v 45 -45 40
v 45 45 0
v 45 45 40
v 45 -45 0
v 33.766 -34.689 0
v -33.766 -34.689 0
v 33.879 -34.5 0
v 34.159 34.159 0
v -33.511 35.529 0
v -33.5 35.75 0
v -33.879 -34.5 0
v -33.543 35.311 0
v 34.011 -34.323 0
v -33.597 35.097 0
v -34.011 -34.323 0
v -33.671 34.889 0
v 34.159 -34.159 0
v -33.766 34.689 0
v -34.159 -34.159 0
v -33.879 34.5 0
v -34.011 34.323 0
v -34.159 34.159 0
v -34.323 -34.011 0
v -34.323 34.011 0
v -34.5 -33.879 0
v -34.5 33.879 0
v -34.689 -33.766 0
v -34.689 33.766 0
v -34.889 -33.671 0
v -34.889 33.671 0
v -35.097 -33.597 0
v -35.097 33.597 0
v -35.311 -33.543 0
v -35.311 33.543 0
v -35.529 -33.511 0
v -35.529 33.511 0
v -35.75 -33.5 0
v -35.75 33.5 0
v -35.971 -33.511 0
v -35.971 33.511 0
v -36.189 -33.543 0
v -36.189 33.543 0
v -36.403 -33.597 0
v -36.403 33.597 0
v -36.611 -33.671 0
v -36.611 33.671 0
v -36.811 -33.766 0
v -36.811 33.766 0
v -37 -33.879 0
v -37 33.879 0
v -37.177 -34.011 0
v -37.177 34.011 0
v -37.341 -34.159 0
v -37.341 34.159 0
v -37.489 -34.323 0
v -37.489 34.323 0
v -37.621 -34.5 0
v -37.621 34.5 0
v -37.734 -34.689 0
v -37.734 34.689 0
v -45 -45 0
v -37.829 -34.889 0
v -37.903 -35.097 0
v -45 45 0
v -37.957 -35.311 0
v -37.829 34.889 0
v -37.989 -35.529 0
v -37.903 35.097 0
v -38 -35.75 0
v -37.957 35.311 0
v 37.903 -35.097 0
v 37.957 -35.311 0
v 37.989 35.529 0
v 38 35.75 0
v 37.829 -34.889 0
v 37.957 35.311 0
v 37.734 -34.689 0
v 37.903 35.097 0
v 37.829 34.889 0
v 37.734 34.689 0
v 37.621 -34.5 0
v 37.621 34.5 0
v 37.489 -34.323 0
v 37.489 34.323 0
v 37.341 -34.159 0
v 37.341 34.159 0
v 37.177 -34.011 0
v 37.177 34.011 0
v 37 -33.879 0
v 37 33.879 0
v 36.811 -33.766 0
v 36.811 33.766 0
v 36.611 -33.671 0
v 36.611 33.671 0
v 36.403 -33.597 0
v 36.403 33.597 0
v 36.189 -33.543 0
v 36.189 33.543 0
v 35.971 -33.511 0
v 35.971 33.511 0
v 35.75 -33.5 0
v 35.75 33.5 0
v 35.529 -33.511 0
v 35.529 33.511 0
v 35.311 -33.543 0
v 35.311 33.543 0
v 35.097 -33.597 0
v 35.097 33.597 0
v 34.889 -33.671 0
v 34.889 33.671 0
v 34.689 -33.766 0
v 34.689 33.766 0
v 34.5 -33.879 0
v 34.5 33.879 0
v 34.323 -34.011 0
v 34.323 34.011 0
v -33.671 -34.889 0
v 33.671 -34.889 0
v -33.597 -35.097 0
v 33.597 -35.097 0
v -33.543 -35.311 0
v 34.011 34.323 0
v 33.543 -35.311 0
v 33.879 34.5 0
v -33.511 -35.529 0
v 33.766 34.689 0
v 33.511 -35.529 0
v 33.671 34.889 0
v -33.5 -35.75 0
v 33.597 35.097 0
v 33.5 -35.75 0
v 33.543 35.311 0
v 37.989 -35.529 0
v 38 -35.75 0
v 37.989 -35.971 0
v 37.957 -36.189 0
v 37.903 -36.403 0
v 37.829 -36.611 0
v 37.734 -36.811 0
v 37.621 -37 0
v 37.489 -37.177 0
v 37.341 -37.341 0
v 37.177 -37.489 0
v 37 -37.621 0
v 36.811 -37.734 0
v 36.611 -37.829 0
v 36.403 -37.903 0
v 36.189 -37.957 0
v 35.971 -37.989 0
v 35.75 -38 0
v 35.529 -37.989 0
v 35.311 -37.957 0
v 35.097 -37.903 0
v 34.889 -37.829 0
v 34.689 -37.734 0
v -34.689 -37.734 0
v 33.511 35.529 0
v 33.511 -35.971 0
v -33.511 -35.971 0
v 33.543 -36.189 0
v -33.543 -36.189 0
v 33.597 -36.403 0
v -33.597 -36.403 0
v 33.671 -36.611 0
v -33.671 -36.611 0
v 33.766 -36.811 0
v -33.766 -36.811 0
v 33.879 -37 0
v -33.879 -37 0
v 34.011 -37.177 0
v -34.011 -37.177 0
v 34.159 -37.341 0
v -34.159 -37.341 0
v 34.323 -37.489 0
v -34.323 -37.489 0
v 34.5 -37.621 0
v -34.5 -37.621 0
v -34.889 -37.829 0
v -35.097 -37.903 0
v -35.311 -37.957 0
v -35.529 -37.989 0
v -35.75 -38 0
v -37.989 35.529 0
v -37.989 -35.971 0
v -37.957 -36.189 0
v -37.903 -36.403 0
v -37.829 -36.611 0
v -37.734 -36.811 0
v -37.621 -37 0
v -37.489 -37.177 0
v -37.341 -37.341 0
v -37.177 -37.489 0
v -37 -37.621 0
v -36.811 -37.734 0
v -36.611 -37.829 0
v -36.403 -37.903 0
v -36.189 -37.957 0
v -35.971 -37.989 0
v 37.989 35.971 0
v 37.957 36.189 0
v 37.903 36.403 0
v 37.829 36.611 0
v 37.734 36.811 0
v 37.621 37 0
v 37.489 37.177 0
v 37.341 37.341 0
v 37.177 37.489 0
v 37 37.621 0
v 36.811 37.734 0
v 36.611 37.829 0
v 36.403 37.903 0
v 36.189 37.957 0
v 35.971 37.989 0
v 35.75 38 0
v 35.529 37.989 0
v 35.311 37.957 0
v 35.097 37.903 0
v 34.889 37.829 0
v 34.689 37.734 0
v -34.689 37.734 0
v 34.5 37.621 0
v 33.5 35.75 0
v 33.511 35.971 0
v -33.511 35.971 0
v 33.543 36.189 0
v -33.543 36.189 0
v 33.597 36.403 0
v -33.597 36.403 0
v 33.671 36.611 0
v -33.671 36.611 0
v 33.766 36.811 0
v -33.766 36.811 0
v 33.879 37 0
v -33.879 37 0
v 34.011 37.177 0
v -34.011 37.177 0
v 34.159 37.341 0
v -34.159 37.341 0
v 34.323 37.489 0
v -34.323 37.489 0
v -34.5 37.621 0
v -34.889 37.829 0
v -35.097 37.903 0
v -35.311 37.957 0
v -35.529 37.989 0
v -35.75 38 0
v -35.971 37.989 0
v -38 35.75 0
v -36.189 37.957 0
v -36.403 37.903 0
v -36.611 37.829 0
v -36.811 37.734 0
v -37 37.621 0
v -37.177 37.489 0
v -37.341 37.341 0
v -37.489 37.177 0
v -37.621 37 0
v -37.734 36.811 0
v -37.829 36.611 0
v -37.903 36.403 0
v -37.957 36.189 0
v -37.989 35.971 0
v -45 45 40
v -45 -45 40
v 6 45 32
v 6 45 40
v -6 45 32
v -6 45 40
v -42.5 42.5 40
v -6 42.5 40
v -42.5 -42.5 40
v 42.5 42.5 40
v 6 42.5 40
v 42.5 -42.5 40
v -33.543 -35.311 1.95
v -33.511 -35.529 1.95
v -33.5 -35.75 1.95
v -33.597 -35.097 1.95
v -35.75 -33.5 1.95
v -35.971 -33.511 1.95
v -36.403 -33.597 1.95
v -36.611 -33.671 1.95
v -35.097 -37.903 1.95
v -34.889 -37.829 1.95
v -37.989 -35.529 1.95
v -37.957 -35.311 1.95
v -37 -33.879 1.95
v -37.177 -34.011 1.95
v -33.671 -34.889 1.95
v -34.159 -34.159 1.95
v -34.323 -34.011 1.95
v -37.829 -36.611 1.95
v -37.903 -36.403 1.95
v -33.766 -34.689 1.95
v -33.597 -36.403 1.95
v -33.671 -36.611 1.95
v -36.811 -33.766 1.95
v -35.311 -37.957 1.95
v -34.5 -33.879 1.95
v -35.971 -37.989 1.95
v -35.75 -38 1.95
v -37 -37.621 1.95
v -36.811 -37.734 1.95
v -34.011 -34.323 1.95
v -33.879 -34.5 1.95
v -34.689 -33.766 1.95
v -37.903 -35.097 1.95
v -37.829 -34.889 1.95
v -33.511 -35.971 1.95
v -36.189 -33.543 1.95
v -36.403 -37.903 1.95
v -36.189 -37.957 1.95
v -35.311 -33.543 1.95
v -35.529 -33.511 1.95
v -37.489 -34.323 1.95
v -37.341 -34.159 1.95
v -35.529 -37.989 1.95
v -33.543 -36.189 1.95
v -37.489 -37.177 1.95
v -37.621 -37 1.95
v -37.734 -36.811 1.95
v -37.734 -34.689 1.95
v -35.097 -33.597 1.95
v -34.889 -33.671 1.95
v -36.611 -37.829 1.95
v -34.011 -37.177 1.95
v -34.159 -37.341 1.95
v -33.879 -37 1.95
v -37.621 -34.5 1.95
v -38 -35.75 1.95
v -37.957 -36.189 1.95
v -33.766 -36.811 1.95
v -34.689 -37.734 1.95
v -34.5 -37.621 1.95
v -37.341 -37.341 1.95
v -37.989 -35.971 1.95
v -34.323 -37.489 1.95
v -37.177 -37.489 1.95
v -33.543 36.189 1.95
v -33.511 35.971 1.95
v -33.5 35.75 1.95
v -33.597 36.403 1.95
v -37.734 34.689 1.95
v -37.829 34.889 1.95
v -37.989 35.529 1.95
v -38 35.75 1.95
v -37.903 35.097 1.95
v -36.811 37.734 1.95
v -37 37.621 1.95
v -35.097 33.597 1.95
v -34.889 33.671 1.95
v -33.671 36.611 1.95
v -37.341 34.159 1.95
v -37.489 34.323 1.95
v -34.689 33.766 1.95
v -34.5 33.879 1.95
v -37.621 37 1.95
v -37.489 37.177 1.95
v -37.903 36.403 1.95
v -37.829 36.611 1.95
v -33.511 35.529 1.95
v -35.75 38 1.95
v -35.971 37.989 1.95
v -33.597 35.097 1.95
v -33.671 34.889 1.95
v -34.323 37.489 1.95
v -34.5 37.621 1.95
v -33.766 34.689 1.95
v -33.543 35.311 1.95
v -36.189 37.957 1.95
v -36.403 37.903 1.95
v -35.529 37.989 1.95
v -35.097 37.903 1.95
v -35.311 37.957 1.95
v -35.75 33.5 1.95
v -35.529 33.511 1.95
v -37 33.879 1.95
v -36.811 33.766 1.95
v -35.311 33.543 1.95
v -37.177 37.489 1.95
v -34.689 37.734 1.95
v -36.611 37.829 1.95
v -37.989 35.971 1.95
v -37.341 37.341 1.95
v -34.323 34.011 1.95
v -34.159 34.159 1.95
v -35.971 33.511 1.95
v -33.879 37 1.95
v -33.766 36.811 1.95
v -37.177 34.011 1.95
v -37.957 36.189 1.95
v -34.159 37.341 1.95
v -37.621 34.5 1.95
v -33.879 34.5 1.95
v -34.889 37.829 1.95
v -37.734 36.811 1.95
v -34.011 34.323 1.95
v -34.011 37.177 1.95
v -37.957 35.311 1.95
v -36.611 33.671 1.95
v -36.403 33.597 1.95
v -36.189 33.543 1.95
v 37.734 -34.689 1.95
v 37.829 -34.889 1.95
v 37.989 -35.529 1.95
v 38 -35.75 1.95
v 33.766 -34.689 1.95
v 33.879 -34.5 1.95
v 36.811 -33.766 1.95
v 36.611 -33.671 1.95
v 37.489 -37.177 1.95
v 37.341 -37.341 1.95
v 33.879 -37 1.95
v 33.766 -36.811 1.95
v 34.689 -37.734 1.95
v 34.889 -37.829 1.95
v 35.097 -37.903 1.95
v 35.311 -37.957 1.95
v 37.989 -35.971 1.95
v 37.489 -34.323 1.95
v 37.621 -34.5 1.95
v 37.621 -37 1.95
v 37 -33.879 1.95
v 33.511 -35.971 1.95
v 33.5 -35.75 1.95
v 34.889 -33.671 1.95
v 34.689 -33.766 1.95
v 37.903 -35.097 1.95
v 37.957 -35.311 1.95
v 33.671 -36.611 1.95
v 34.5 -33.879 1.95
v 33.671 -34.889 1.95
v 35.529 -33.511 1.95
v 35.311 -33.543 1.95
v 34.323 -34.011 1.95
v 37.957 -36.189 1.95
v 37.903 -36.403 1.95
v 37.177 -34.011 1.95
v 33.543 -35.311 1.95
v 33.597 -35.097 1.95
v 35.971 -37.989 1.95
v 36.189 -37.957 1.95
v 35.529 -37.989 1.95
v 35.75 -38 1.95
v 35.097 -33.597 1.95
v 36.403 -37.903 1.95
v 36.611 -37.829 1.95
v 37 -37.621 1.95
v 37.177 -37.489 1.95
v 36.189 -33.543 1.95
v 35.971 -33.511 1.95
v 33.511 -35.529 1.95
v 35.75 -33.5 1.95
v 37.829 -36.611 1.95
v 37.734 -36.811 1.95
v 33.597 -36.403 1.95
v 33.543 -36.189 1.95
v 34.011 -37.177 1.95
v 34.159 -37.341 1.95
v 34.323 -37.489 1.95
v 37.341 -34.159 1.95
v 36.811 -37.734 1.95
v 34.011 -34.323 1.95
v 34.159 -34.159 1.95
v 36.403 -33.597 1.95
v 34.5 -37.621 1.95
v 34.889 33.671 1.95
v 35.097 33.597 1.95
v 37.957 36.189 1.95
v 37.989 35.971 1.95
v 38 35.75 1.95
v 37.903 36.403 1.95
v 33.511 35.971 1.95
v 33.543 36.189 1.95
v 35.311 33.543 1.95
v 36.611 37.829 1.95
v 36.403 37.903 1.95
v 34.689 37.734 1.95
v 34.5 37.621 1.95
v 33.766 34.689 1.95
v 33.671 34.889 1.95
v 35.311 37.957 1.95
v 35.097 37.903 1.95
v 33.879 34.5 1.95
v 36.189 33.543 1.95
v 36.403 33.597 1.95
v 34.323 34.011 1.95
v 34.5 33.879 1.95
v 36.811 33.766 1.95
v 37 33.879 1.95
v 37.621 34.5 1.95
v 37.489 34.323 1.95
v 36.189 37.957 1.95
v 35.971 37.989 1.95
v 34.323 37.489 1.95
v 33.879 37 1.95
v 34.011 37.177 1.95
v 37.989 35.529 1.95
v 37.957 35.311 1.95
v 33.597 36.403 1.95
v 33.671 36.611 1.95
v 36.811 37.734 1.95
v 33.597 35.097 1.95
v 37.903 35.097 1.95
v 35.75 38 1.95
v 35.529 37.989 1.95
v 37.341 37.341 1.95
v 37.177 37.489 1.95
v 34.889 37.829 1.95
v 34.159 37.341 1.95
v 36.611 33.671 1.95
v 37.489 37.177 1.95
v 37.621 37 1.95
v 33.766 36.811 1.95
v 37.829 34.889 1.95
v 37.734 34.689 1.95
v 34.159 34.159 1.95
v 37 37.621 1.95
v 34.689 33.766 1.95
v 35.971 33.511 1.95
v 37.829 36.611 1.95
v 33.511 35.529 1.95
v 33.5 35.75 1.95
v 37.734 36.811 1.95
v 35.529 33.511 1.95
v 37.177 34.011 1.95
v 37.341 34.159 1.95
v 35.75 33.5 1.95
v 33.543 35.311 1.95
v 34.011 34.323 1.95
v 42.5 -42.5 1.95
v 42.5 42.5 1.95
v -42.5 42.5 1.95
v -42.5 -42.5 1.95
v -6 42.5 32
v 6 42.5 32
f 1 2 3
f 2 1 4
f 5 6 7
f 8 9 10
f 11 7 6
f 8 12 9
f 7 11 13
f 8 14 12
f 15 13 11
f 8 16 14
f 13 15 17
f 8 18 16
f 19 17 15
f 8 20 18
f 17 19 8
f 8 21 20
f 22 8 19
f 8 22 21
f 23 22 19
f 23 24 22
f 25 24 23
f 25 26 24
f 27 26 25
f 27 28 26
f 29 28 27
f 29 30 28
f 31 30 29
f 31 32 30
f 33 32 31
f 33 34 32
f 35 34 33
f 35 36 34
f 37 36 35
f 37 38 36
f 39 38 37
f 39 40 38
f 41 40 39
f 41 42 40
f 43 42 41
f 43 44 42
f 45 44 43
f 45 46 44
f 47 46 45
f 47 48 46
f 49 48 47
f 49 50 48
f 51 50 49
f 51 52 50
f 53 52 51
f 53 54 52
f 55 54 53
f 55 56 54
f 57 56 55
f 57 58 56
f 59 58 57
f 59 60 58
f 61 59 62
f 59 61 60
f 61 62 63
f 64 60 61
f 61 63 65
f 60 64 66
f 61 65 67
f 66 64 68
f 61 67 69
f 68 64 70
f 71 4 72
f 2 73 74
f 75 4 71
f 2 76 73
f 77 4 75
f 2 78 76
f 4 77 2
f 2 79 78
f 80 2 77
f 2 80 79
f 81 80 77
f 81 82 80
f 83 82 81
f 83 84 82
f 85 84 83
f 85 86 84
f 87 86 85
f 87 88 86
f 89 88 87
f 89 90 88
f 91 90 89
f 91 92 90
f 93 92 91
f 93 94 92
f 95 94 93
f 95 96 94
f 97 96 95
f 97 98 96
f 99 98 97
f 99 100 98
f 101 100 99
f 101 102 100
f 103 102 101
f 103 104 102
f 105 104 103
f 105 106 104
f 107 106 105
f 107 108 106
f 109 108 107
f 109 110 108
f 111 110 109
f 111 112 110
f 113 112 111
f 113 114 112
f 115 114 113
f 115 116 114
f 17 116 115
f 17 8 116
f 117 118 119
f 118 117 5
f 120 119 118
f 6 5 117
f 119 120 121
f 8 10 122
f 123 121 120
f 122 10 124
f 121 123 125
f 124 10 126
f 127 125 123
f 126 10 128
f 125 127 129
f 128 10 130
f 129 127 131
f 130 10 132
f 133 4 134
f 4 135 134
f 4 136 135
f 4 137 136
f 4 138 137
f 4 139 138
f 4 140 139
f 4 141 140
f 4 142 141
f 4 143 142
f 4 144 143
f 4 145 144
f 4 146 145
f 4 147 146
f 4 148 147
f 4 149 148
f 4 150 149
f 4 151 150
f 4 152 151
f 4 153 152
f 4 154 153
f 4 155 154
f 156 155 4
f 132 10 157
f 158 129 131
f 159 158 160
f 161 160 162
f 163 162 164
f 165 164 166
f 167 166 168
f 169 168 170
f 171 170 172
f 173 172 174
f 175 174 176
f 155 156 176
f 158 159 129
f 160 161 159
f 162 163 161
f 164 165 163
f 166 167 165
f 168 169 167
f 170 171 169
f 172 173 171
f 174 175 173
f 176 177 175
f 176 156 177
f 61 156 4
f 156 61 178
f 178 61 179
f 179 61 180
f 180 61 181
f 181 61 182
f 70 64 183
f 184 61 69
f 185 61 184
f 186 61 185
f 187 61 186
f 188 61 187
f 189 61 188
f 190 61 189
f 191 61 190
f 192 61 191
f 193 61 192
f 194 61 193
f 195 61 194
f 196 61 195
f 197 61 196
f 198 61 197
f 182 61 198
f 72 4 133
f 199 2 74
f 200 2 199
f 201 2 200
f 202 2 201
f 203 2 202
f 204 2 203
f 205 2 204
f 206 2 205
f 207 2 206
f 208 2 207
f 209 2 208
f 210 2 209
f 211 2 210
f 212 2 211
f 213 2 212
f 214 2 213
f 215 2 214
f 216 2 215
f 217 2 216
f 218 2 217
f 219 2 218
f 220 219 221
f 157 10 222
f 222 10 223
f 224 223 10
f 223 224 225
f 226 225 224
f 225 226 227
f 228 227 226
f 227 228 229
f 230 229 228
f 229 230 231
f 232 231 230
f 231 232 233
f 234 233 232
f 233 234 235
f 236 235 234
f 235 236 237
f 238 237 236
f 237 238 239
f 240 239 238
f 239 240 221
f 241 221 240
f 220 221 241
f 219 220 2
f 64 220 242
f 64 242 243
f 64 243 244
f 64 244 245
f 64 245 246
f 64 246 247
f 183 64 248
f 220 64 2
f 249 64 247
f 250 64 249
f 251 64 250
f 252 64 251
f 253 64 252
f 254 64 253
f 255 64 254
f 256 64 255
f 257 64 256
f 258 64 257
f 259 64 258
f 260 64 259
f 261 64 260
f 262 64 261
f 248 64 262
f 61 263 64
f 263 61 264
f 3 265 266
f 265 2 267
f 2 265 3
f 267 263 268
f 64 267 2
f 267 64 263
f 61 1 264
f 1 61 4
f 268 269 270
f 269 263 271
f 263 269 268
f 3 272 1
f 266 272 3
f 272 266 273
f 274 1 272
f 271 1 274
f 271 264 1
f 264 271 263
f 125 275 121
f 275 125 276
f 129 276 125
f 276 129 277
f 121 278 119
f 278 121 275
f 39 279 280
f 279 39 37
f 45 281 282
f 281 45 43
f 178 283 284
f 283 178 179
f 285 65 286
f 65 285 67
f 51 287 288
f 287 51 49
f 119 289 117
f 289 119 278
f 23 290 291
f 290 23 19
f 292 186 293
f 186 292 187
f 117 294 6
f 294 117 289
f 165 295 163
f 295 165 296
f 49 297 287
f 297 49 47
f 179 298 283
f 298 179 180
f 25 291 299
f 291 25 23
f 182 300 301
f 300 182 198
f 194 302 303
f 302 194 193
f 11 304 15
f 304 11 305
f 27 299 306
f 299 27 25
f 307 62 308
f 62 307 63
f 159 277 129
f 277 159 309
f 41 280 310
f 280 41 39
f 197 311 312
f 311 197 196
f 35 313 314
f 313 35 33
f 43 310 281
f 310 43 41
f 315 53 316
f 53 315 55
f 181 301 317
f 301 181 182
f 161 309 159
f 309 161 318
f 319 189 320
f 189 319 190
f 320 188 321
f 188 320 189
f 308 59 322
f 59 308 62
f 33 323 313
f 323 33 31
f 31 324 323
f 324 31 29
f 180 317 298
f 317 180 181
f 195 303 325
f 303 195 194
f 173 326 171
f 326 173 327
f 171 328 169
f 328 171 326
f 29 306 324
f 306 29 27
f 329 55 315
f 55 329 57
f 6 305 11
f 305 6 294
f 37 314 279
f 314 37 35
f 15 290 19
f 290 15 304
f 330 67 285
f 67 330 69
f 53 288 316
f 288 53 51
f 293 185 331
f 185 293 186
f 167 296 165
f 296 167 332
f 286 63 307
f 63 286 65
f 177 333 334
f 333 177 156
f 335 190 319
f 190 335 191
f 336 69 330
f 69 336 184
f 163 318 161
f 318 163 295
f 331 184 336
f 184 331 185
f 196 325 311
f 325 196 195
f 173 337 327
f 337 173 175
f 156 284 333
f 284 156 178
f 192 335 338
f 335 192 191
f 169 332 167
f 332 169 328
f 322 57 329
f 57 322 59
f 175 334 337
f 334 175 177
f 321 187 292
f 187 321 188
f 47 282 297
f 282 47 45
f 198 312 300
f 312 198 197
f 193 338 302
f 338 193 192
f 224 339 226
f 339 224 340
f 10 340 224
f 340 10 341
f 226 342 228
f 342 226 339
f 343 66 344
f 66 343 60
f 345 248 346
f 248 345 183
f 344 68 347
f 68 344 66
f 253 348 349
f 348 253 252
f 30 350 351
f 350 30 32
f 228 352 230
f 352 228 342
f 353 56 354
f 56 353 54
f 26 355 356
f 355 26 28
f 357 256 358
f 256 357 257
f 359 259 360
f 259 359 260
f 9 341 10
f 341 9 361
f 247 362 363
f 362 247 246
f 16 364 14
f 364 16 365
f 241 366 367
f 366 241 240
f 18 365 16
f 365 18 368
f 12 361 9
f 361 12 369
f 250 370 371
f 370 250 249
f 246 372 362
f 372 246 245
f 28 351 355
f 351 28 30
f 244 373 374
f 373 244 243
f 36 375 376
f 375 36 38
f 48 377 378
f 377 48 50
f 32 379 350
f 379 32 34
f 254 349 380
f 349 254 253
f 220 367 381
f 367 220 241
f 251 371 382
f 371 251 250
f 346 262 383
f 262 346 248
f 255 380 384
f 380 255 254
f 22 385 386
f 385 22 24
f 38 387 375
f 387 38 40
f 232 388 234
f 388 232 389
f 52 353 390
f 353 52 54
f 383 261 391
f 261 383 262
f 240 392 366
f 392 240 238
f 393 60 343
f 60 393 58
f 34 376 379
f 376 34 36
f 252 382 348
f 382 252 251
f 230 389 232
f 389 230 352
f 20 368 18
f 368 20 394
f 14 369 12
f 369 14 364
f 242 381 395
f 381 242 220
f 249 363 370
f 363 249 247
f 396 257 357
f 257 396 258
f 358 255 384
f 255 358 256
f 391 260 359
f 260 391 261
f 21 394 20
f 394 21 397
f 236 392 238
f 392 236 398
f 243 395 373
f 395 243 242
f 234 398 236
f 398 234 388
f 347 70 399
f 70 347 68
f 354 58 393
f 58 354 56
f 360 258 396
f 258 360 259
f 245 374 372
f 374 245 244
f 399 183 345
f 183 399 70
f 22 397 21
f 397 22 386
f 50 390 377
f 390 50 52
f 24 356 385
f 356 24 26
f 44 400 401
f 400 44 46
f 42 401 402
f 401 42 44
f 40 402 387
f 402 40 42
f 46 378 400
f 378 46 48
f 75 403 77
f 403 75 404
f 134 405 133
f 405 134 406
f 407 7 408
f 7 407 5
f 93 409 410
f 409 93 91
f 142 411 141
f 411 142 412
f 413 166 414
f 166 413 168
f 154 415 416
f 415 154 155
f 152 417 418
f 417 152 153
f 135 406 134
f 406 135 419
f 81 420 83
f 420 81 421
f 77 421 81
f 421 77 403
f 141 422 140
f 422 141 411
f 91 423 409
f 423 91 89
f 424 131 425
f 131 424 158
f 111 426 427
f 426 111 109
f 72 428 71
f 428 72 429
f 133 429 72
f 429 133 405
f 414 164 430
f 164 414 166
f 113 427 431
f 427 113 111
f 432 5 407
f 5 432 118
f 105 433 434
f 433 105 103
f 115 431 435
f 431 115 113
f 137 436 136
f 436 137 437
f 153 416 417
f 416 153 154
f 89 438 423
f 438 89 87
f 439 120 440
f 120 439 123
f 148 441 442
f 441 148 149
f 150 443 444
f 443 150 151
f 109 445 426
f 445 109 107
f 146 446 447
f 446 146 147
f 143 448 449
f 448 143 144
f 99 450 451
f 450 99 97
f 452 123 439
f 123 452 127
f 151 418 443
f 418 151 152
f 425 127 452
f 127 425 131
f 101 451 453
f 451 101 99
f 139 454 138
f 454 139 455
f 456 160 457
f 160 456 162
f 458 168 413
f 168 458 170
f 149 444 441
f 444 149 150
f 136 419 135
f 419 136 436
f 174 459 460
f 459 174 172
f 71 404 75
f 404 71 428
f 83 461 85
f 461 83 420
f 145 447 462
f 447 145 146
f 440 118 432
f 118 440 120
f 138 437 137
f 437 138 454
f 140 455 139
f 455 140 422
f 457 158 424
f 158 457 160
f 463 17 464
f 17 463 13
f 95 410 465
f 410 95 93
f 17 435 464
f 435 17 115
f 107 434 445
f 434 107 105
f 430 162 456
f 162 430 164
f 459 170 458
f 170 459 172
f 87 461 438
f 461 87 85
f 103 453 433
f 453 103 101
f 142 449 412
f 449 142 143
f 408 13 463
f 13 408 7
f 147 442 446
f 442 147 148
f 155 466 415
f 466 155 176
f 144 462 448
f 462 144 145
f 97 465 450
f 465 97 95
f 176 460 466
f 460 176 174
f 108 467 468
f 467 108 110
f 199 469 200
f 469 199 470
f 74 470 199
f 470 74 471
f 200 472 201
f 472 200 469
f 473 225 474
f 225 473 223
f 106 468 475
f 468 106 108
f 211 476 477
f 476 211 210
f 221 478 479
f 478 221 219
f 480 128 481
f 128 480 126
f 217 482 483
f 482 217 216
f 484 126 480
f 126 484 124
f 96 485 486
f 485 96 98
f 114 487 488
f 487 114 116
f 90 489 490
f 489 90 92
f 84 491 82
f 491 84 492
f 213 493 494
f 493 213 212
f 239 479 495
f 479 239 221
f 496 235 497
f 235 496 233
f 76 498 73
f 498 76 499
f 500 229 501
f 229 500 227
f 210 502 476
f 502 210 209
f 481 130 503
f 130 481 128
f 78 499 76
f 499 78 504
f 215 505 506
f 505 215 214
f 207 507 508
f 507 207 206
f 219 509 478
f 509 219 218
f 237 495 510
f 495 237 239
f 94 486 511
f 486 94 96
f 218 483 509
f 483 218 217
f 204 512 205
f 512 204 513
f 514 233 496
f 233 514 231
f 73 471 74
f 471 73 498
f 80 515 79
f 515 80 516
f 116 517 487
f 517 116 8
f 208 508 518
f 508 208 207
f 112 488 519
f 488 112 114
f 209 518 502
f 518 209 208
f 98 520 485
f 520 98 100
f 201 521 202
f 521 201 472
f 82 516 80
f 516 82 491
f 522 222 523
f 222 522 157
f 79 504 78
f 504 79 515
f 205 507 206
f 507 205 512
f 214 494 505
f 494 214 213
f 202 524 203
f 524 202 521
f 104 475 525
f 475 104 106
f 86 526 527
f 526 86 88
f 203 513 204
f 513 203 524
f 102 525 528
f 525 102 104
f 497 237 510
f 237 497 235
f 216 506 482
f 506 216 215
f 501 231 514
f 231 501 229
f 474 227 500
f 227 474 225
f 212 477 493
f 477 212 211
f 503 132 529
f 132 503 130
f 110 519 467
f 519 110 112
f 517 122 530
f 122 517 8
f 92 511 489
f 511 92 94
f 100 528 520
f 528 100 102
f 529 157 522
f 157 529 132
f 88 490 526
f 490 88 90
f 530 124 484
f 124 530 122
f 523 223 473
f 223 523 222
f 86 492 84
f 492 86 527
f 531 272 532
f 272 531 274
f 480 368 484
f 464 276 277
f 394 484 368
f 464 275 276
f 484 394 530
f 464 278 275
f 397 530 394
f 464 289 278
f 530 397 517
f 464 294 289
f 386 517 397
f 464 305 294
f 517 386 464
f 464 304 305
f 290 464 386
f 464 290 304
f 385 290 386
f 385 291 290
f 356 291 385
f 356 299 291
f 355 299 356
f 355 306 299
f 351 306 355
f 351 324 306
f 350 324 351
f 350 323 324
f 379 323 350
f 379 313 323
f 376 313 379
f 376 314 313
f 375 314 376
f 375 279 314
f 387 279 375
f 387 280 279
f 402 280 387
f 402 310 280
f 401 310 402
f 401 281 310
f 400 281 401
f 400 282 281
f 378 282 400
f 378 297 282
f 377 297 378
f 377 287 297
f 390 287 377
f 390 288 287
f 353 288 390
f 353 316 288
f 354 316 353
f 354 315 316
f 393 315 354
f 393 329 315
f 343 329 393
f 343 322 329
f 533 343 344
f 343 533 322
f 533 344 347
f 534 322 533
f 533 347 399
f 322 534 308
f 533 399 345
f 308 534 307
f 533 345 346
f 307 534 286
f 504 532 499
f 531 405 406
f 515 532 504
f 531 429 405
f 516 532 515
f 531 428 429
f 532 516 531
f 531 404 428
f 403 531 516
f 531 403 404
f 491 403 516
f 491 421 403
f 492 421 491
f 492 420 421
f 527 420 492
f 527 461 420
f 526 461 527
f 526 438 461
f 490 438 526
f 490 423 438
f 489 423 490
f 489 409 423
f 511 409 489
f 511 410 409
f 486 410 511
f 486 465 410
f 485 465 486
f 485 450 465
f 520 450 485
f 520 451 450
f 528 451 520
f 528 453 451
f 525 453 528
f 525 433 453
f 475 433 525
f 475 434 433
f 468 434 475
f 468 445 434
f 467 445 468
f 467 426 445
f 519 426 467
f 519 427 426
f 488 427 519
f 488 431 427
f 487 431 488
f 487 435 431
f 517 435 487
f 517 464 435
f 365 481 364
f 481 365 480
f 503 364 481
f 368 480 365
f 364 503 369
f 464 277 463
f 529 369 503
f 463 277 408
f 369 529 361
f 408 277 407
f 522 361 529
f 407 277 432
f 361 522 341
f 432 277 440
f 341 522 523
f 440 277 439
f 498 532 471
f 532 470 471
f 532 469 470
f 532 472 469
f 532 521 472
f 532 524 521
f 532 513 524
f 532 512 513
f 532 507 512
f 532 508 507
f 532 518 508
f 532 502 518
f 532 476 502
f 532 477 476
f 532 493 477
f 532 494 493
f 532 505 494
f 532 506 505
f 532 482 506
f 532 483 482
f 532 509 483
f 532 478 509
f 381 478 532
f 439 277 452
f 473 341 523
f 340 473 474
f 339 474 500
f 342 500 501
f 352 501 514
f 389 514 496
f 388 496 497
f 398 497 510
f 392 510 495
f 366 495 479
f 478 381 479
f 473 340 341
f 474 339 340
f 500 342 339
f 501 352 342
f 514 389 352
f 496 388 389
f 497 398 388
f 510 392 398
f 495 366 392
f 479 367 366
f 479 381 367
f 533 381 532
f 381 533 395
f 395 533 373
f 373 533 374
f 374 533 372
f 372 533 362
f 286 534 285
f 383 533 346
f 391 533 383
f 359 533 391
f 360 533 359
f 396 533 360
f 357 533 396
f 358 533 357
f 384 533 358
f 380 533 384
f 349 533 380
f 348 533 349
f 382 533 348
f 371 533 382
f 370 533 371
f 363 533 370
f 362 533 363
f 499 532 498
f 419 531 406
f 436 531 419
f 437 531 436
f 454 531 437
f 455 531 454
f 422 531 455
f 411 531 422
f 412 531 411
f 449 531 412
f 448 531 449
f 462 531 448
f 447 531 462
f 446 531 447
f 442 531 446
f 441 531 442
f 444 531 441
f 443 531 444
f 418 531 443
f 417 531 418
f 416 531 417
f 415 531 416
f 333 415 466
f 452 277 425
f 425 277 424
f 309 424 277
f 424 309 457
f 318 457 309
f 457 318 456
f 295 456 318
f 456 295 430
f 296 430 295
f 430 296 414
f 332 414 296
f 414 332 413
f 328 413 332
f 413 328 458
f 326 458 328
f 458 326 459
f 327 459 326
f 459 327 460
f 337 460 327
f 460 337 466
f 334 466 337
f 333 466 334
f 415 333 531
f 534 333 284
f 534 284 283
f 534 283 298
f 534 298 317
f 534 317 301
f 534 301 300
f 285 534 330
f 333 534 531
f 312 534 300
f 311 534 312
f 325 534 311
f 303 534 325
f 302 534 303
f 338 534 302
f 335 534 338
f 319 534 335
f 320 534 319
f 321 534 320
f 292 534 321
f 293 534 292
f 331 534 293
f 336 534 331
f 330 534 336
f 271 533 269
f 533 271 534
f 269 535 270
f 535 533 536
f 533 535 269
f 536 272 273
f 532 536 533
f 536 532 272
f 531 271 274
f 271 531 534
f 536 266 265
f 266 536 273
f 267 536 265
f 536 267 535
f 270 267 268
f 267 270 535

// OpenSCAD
// DIY Magnetic Stirrer Housing
// Upside-down open box for 80mm PC fan
// Print orientation: top plate on bed (z=0-2), walls rising to z=40

// Dimensions (all in mm)
outer_size = 90;              // Outer dimension 90 x 90 mm
top_plate_thickness = 2;      // Top plate thickness
wall_thickness = 2.5;         // Wall thickness on all sides
total_height = 40;            // Total height from bed to open edge
mounting_hole_diameter = 4.5; // M4 screw hole diameter
mounting_hole_pattern = 71.5; // Mounting hole square pattern (center-to-center)
cable_notch_width = 12;       // Power cable notch width
cable_notch_depth = 8;        // Notch depth from open edge

// Resolution for curves
$fn = 64;

// Derived dimensions
inner_size = outer_size - 2 * wall_thickness;  // 85 mm inner cavity
wall_height = total_height - top_plate_thickness;  // 38 mm
hole_offset = mounting_hole_pattern / 2;  // 35.75 mm from center to each hole

difference() {
    // Create outer box shell
    union() {
        // Top plate: 90 x 90 x 2 mm at z = 0 to 2
        translate([0, 0, top_plate_thickness / 2])
            cube([outer_size, outer_size, top_plate_thickness], center = true);
        
        // Walls: 90 x 90 outer, rising from z = 2 to z = 40
        translate([0, 0, top_plate_thickness + wall_height / 2])
            cube([outer_size, outer_size, wall_height], center = true);
    }
    
    // Cut out interior cavity (hollow the walls)
    // Creates 85 x 85 mm cavity from z = 2 to z = 40
    translate([0, 0, top_plate_thickness + wall_height / 2])
        cube([inner_size, inner_size, wall_height + 0.1], center = true);
    
    // Drill four M4 mounting holes through top plate
    // 71.5 mm square pattern, centered on plate
    for (dx = [-1, 1]) {
        for (dy = [-1, 1]) {
            translate([dx * hole_offset, dy * hole_offset, -0.5])
                cylinder(h = top_plate_thickness + 1, r = mounting_hole_diameter / 2, $fn = 64);
        }
    }
    
    // Power cable notch in +Y wall
    // 12 mm wide (X direction), centered, 8 mm deep from open edge (z = 32 to z = 40)
    notch_z_center = total_height - cable_notch_depth / 2;
    notch_y_center = outer_size / 2 - wall_thickness / 2;  // Center of wall thickness
    translate([0, notch_y_center, notch_z_center])
        cube([cable_notch_width, wall_thickness + 1, cable_notch_depth], center = true);
}
